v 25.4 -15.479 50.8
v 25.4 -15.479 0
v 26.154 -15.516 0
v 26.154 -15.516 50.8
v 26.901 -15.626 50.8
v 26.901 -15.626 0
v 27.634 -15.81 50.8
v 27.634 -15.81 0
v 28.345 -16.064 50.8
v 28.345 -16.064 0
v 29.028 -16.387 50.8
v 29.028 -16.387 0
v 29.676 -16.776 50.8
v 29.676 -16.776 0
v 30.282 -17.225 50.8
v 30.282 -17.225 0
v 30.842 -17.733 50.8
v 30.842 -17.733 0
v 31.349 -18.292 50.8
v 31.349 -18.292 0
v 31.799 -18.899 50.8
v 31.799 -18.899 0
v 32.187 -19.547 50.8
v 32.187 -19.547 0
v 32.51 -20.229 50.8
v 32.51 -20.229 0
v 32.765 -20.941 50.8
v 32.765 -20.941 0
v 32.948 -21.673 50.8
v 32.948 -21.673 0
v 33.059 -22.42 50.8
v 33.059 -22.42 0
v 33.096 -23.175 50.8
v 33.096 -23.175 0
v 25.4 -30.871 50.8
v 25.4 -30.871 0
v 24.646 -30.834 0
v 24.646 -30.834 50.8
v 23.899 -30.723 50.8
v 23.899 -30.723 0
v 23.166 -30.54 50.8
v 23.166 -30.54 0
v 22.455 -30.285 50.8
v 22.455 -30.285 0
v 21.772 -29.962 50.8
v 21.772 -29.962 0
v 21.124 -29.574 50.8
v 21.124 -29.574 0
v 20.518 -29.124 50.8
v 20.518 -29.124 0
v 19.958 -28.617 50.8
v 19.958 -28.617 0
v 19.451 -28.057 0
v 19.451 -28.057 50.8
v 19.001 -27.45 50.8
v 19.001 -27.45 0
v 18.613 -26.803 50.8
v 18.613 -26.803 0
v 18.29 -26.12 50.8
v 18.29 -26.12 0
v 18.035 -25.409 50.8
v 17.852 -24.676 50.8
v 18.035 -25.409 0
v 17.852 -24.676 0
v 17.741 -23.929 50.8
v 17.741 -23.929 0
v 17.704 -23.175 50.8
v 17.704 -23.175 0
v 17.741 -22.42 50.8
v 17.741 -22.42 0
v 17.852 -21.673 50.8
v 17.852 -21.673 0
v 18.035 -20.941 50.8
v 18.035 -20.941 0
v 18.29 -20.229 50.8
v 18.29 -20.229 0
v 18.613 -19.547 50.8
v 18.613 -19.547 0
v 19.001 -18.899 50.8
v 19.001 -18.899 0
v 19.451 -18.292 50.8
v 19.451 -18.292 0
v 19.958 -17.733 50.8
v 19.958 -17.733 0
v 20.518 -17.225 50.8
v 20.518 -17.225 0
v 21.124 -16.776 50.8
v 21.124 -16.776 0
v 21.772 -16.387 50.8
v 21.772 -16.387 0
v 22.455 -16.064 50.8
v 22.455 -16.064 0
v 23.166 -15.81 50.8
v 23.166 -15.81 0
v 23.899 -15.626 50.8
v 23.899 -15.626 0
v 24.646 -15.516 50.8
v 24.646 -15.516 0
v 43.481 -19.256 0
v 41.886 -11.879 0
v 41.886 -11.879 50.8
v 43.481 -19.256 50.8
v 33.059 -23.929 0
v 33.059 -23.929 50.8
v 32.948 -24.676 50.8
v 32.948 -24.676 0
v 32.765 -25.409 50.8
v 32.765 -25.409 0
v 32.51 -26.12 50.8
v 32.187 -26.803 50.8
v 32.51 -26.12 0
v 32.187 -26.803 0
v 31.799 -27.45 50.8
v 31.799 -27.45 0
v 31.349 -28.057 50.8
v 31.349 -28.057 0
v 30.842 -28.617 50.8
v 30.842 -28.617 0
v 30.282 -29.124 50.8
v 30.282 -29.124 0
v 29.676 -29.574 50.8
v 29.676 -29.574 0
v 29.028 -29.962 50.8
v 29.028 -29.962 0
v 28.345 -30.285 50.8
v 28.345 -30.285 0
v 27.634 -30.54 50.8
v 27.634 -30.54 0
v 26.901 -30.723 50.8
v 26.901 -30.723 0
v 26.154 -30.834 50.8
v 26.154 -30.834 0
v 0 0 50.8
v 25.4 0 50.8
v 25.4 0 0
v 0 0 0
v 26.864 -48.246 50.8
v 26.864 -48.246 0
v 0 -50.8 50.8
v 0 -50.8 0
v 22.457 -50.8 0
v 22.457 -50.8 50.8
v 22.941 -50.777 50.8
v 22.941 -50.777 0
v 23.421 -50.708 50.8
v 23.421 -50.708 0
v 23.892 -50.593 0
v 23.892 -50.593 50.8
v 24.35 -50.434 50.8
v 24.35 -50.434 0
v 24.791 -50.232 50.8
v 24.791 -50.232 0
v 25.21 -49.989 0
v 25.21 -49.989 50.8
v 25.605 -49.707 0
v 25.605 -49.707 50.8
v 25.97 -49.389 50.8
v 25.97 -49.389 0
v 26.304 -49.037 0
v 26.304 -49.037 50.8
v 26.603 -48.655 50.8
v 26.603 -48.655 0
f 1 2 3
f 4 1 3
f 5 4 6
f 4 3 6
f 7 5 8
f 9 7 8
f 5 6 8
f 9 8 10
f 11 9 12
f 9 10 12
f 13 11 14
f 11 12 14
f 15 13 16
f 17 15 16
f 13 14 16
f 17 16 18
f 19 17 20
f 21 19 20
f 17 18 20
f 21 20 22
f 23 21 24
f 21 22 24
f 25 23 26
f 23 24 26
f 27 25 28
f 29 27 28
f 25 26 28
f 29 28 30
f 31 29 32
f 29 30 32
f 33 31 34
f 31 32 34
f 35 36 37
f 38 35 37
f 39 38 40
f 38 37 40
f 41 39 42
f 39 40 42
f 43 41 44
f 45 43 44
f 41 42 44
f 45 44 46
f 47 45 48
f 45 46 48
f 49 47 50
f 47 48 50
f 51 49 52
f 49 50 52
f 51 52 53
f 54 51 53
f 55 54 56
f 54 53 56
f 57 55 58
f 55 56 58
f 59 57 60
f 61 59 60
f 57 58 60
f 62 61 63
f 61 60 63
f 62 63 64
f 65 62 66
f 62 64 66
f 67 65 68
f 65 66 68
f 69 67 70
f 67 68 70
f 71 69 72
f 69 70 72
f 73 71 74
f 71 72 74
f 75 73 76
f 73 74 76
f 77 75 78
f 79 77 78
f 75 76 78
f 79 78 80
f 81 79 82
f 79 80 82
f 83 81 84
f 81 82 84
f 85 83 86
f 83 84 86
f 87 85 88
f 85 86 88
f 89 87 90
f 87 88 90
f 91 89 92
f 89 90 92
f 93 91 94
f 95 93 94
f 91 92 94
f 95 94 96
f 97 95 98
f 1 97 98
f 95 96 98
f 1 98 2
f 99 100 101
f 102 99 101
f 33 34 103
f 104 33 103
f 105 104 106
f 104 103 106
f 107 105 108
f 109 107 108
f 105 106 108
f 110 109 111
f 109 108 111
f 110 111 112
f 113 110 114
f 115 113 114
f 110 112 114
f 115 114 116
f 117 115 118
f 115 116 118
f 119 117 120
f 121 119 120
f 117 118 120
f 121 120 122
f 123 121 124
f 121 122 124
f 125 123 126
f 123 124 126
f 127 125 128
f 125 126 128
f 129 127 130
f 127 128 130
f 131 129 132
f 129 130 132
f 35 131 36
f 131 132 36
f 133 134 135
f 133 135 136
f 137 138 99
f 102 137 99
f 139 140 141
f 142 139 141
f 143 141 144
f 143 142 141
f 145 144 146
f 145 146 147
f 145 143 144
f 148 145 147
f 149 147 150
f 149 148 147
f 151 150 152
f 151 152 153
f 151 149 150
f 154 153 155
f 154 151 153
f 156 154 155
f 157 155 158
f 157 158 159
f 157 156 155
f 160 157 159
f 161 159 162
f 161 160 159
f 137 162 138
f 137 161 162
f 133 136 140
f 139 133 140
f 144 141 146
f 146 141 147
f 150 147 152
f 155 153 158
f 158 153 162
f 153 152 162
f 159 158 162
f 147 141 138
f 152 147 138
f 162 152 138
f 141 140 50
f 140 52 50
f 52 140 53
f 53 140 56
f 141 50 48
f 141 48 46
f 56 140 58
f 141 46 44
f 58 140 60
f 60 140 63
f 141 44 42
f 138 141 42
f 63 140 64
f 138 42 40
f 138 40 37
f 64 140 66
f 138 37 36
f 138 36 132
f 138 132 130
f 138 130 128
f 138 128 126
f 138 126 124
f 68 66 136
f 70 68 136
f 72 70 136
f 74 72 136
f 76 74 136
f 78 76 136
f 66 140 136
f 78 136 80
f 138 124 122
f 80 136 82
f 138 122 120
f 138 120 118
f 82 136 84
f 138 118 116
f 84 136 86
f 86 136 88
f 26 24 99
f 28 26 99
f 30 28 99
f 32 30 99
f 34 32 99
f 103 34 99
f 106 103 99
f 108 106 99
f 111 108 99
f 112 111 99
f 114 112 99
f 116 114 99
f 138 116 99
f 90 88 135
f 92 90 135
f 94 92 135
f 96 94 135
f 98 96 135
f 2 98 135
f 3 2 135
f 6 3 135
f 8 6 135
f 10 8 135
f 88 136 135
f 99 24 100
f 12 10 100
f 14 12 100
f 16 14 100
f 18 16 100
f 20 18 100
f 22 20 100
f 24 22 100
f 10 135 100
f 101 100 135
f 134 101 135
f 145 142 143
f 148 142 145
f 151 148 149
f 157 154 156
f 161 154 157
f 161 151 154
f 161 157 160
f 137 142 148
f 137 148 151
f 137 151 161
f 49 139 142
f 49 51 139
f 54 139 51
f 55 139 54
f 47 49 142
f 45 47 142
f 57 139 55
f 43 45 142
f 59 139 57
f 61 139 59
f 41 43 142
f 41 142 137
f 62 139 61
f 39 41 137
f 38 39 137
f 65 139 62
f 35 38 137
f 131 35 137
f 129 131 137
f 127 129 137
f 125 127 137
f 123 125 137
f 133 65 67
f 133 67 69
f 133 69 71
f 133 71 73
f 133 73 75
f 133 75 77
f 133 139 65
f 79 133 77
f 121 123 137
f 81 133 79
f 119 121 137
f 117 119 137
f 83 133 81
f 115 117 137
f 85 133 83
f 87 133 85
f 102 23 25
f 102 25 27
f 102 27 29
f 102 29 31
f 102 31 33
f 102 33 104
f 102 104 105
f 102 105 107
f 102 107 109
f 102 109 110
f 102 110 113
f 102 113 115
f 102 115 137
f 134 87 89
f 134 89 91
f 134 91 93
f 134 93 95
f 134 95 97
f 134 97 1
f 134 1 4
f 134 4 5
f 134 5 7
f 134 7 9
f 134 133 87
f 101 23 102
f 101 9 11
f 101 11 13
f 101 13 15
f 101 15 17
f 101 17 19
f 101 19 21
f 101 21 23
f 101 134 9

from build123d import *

# Parameters (mm, degrees)
F1_DEPTH = 50.8
F2_R     = 5.08
F3_SIZE  = 5.08


with BuildPart() as f1:
    # F0 (on Top) → F1 (new body)
    with BuildSketch(Plane.XY):
        with BuildLine():
            Line((25.4, 0), (0, 0))
            Line((0, 0), (0, -50.8))
            Line((0, -50.8), (25.4, -50.8))
            Line((25.4, -50.8), (25.4, -30.870903))
            ThreePointArc((25.4, -30.870903), (17.7038, -23.174703), (25.4, -15.478503))
            Line((25.4, -15.478503), (25.4, 0))
        make_face()
        with BuildLine():
            Line((46.007535, -14.848889), (25.4, 0))
            Line((25.4, 0), (25.4, -15.478503))
            ThreePointArc((25.4, -15.478503), (30.842035, -17.732668), (33.0962, -23.174703))
            ThreePointArc((33.0962, -23.174703), (30.842035, -28.616738), (25.4, -30.870903))
            Line((25.4, -30.870903), (25.4, -50.8))
            Line((25.4, -50.8), (46.007535, -14.848889))
        make_face()
    extrude(amount=F1_DEPTH)

    # F2
    f2_edges = [f1.edges().sort_by_distance(p)[0] for p in [
        (25.4, -50.8, 25.4),
    ]]
    fillet(f2_edges, radius=F2_R)

    # F3
    f3_edges = [f1.edges().sort_by_distance(p)[0] for p in [
        (46.007535, -14.848889, 25.4),
    ]]
    chamfer(f3_edges, length=F3_SIZE)


solid = f1.part
